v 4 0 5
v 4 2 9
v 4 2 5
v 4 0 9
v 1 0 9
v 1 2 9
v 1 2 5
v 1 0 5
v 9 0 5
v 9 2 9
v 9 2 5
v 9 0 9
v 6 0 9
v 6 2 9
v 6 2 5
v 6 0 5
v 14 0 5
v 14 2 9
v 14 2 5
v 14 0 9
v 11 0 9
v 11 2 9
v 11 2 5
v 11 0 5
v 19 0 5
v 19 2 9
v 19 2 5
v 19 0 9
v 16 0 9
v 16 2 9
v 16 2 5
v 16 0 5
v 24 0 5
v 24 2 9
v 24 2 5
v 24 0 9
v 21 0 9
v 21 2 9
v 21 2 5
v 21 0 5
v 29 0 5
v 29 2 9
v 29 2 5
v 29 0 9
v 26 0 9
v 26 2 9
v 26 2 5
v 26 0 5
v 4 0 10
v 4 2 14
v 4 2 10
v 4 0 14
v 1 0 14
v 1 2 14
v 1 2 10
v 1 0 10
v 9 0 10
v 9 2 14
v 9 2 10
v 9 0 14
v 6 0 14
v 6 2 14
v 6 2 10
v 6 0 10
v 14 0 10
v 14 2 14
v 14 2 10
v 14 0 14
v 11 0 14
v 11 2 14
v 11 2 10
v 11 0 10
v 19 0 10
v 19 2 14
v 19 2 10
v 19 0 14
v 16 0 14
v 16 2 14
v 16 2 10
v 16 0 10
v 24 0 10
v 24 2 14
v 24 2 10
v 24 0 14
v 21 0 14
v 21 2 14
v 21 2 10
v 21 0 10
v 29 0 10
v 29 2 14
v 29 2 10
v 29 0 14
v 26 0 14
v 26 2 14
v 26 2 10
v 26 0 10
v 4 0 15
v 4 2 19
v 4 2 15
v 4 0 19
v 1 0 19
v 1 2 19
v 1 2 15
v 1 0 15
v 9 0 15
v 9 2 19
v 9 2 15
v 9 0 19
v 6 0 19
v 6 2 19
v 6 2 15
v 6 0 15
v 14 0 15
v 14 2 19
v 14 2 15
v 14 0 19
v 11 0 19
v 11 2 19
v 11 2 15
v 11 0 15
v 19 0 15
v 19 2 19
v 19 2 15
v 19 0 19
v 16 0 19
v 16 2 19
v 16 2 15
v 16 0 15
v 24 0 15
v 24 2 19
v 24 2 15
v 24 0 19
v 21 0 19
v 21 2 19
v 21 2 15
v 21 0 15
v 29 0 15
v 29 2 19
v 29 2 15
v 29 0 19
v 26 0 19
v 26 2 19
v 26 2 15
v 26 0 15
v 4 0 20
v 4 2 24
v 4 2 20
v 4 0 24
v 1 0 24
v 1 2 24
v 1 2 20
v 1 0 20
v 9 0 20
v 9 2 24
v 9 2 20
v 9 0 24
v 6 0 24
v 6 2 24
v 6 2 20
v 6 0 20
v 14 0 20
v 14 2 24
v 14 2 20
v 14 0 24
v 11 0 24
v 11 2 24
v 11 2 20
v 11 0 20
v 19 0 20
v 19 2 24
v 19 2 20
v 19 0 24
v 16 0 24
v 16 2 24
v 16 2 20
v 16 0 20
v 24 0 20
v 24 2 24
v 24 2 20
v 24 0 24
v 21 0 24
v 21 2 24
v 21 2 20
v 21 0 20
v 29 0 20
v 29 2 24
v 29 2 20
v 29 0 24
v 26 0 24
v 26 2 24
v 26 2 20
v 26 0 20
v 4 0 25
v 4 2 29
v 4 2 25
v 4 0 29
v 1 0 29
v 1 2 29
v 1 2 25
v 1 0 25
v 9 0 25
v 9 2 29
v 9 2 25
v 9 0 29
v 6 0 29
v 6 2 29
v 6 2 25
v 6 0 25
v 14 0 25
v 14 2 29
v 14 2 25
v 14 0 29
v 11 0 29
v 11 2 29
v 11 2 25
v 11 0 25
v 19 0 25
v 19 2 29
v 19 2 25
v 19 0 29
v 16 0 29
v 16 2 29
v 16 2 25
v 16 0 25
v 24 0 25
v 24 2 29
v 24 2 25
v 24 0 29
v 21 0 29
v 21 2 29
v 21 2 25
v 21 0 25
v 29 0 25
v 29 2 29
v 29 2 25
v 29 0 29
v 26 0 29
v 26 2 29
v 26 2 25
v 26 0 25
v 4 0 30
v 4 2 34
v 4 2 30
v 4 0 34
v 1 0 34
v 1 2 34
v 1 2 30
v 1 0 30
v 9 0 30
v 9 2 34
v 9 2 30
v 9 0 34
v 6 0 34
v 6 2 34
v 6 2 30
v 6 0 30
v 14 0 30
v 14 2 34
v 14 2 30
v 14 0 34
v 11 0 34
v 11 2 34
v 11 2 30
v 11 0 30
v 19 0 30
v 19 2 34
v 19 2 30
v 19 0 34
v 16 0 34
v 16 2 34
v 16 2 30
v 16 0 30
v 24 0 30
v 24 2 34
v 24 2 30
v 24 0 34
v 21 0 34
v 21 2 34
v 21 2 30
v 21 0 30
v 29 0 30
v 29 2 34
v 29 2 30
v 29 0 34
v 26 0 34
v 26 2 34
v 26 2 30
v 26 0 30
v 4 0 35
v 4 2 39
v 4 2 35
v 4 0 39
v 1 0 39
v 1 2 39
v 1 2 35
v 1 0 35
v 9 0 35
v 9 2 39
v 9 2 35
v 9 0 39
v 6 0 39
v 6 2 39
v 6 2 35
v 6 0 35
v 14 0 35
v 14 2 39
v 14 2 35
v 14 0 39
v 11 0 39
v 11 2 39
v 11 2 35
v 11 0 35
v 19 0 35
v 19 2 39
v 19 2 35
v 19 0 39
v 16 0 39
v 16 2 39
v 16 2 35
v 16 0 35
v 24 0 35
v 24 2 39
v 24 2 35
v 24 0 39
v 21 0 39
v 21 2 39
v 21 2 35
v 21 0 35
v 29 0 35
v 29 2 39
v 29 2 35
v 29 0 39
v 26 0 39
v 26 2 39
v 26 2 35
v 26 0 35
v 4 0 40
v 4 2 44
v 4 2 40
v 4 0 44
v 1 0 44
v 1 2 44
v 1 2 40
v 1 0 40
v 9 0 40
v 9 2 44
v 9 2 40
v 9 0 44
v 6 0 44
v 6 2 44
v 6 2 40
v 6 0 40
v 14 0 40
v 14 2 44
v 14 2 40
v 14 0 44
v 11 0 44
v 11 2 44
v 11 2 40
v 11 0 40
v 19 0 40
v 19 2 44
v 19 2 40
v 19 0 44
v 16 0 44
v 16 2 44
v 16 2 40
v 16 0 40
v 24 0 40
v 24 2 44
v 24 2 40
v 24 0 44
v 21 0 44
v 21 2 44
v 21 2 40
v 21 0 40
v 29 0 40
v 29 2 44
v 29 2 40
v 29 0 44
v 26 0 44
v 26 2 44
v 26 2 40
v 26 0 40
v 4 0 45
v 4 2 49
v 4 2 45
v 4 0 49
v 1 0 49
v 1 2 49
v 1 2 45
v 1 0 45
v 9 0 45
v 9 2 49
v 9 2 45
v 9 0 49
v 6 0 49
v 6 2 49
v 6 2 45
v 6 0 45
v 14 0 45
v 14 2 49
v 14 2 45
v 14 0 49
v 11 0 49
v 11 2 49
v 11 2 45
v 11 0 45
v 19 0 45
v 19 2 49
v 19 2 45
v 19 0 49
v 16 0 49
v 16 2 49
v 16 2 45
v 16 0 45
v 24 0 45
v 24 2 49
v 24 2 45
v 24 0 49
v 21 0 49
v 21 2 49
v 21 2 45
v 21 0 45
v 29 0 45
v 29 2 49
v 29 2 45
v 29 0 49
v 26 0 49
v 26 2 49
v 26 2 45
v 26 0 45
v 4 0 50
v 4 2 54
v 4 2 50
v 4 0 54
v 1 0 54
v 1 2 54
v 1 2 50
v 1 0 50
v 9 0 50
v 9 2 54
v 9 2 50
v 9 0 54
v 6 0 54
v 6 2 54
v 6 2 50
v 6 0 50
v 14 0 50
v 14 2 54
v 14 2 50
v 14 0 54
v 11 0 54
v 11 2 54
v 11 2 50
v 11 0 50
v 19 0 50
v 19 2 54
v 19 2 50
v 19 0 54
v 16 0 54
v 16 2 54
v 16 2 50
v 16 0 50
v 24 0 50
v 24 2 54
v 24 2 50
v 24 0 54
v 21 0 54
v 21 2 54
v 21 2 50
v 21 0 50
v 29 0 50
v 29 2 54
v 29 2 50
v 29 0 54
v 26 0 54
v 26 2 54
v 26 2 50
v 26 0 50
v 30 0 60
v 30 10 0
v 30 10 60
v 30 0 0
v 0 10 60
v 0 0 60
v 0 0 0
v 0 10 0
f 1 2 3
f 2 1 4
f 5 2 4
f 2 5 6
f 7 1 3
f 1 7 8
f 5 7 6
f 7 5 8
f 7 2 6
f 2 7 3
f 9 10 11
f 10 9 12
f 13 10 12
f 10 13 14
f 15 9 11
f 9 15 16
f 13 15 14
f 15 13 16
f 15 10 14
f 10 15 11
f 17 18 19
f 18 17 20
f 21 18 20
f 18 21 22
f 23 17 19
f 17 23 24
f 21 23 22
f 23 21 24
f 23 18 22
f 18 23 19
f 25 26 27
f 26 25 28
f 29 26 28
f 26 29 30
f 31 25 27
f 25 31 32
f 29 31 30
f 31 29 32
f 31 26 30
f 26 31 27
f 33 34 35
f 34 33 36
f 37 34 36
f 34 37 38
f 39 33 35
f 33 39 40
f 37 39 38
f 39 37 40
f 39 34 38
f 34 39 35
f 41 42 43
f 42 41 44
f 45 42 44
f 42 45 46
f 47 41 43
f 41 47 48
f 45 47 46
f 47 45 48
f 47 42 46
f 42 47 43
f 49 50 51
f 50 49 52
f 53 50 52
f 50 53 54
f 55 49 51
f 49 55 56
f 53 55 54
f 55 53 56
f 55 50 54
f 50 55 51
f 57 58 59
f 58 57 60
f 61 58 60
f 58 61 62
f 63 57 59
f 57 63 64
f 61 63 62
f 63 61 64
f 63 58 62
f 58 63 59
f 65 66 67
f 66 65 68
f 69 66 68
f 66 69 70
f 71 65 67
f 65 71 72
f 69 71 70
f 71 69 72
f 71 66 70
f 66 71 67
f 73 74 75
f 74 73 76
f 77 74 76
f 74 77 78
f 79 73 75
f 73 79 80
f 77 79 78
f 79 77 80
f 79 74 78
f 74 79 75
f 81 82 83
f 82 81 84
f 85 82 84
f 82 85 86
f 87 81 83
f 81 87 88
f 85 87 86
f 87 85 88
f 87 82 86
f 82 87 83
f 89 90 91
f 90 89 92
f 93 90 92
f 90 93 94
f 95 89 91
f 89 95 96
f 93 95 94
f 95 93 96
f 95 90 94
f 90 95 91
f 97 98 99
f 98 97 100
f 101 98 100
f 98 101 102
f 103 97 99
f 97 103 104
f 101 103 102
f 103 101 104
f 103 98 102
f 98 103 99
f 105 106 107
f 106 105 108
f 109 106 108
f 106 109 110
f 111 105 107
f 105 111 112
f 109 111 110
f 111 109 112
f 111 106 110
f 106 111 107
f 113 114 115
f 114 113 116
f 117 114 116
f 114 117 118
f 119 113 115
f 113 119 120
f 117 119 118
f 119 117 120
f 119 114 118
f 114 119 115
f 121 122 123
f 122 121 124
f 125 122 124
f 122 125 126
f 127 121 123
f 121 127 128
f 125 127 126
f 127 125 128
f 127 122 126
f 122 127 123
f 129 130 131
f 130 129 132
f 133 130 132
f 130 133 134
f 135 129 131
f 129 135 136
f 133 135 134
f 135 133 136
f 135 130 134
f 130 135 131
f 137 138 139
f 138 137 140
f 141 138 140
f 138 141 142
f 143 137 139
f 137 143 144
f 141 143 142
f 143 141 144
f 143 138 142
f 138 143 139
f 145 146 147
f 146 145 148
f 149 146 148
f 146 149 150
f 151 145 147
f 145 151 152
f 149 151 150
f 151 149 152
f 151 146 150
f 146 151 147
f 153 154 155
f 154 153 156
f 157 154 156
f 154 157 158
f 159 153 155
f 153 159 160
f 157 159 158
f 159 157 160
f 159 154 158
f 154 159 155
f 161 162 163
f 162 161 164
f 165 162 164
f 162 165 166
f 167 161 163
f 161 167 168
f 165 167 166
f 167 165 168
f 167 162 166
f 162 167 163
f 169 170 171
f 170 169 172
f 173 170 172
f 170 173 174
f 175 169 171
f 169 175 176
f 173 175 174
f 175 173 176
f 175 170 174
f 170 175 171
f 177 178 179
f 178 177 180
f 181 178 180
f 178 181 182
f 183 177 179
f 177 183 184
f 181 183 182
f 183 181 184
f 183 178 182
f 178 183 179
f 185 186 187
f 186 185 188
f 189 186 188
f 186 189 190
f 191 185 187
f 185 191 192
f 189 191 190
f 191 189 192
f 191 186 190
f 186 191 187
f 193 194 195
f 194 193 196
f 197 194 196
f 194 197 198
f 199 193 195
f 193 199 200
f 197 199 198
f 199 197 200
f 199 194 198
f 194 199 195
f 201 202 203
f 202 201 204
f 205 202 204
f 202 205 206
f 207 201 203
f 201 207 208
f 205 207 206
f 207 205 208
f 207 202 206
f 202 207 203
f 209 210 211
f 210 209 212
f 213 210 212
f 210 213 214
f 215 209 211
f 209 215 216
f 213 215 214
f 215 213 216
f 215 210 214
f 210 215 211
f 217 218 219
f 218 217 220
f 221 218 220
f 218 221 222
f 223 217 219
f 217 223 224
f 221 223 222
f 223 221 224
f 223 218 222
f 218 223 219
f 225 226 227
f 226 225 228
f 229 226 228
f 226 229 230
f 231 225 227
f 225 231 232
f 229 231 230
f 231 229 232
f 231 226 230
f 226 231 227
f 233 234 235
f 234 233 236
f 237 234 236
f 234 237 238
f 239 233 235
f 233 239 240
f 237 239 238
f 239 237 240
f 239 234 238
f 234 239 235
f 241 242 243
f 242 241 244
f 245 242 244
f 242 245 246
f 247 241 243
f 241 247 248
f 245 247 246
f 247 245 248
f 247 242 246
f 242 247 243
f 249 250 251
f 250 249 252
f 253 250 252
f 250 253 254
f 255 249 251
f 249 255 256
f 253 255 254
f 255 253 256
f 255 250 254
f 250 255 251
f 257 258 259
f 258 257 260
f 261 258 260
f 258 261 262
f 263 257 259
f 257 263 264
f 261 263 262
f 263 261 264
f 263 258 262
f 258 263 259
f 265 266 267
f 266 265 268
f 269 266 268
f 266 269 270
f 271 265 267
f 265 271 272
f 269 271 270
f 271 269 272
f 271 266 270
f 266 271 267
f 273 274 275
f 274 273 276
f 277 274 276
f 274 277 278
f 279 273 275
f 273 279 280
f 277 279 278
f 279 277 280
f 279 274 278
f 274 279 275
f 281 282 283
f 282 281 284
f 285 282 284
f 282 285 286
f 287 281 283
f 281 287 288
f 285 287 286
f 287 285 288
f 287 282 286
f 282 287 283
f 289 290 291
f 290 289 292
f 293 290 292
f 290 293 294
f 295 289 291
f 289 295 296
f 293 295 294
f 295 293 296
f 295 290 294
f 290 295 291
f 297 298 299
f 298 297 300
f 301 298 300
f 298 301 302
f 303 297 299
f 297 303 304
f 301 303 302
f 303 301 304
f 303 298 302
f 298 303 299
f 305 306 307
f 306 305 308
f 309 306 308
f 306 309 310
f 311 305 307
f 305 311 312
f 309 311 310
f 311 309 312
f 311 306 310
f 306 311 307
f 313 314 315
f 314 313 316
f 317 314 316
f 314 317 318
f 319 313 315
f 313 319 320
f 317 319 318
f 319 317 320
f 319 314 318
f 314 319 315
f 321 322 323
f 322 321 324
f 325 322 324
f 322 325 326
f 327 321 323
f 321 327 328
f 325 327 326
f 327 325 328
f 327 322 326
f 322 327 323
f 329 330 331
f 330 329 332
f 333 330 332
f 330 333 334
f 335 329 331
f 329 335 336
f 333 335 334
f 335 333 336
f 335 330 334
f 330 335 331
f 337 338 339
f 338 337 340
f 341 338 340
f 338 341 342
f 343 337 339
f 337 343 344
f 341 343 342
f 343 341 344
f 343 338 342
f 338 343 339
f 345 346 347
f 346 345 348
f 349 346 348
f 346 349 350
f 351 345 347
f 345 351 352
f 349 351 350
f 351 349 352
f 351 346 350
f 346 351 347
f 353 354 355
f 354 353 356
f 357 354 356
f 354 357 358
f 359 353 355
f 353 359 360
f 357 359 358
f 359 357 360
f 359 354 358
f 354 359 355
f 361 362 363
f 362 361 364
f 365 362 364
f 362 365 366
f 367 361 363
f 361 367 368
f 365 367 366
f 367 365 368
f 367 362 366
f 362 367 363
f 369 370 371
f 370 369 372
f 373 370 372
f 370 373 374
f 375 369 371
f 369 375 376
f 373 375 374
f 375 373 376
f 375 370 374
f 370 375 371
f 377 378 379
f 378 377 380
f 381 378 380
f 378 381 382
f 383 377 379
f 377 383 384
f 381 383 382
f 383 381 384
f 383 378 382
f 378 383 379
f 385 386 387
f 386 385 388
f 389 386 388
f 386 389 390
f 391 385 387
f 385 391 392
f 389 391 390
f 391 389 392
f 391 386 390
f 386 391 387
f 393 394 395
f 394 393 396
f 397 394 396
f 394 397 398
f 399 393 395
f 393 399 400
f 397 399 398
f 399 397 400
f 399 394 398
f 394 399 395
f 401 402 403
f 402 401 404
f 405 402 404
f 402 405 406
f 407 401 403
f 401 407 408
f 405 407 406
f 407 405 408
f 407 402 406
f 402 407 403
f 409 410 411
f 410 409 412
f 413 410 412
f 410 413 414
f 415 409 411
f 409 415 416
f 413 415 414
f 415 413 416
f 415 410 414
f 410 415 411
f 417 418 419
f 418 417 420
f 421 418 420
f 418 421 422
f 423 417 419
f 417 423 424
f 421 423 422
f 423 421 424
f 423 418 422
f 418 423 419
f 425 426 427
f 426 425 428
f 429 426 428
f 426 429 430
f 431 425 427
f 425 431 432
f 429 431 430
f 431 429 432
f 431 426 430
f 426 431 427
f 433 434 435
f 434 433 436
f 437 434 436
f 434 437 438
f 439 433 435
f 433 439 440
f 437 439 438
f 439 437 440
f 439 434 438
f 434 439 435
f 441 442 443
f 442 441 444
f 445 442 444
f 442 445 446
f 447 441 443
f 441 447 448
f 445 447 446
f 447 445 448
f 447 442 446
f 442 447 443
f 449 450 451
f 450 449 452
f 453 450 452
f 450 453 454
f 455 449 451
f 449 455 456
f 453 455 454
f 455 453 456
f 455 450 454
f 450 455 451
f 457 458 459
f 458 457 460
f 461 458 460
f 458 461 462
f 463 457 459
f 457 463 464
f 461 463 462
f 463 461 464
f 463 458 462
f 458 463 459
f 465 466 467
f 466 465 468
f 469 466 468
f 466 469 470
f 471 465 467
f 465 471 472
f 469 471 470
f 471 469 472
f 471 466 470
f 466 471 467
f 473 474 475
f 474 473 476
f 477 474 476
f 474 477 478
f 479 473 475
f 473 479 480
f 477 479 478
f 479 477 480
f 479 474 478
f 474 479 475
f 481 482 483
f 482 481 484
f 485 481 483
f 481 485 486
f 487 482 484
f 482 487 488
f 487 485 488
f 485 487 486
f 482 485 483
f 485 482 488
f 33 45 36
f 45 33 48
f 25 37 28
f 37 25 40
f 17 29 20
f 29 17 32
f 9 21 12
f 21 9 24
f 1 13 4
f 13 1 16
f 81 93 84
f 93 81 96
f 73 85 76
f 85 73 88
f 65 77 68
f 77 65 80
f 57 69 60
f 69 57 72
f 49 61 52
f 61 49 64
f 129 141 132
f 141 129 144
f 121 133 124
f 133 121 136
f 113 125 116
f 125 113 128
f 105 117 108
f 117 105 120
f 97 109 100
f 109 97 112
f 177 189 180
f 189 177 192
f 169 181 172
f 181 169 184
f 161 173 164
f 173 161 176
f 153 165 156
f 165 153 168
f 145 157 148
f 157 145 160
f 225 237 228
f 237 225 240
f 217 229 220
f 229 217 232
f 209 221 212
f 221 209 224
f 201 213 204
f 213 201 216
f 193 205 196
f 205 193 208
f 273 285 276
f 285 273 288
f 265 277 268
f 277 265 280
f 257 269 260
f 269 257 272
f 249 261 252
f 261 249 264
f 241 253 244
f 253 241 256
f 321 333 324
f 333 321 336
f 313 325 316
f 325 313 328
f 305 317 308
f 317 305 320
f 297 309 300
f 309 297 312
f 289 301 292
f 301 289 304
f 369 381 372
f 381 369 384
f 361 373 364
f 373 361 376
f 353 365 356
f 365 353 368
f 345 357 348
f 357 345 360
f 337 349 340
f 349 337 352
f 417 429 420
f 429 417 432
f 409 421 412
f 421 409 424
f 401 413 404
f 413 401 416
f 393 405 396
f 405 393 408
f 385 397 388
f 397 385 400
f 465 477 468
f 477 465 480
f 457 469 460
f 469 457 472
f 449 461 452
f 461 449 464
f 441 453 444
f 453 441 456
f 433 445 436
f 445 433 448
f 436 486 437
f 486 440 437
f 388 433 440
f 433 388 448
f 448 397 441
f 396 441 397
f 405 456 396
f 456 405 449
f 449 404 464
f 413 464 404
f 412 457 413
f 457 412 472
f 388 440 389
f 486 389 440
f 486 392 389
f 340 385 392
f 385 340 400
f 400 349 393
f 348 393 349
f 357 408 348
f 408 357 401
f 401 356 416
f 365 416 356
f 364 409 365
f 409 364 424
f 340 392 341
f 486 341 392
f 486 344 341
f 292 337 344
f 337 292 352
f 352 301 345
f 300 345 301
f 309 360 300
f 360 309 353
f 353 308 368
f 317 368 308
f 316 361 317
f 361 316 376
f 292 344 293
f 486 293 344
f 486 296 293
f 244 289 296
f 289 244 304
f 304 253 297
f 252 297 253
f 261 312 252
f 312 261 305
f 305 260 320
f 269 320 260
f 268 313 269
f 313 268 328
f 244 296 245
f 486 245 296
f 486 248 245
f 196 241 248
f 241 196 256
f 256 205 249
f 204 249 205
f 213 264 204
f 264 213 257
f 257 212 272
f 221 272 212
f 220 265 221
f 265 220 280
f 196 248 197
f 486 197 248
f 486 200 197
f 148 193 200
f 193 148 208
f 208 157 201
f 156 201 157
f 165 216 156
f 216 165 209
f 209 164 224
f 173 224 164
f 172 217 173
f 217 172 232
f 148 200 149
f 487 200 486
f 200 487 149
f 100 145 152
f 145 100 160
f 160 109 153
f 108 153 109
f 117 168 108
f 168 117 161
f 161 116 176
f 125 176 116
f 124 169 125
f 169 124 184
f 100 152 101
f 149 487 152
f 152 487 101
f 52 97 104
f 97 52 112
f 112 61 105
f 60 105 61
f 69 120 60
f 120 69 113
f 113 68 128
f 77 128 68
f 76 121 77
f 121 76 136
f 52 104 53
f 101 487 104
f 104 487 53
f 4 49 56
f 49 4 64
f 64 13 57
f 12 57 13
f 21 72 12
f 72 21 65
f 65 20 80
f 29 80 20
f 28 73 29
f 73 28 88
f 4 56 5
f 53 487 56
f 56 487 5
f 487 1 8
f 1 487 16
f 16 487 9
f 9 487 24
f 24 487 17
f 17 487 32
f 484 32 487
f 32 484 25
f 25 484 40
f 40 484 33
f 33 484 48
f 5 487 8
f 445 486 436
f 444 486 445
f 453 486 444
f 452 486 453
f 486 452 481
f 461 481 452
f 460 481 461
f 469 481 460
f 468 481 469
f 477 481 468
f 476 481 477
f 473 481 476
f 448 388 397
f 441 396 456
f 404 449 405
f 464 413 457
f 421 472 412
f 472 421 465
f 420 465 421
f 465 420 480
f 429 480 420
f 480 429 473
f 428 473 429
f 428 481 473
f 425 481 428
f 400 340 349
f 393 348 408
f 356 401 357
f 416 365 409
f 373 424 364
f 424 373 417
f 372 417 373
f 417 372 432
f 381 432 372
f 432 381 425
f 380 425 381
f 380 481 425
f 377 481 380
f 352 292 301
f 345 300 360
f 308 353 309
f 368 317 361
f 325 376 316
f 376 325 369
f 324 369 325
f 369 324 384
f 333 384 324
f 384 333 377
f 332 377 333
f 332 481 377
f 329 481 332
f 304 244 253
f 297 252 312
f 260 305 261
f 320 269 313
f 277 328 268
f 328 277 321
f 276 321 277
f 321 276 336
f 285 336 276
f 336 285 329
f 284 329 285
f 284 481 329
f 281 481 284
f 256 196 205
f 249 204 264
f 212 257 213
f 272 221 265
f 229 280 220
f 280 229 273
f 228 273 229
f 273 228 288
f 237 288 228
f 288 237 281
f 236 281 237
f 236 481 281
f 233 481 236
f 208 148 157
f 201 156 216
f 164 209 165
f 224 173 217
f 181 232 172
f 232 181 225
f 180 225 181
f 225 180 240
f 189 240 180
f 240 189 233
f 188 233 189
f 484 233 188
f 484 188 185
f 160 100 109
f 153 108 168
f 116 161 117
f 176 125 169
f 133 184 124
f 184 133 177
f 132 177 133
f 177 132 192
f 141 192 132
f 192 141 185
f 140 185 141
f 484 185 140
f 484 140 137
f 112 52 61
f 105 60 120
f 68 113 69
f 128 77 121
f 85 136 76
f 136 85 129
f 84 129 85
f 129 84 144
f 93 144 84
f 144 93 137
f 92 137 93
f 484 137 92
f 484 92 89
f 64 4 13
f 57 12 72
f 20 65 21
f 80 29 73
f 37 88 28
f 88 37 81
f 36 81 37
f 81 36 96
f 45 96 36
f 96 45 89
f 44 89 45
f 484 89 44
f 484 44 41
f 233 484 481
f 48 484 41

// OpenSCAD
num_rows = 10;
num_cols = 6;

building_width = num_cols * 5;
building_height = num_rows * 6;

difference() {
  cube(size=[building_width, 10, building_height]);

  for (z=[1:1:num_rows]) {
    for (x=[0:1:10]) {
      x_pos = x * 5 + 1;
      z_pos = z * 5;
      translate([x_pos, -1, z_pos]) {
        cube(size=[3, 3, 4]);
      } // x loop
    } // z loop
  } // difference
}
